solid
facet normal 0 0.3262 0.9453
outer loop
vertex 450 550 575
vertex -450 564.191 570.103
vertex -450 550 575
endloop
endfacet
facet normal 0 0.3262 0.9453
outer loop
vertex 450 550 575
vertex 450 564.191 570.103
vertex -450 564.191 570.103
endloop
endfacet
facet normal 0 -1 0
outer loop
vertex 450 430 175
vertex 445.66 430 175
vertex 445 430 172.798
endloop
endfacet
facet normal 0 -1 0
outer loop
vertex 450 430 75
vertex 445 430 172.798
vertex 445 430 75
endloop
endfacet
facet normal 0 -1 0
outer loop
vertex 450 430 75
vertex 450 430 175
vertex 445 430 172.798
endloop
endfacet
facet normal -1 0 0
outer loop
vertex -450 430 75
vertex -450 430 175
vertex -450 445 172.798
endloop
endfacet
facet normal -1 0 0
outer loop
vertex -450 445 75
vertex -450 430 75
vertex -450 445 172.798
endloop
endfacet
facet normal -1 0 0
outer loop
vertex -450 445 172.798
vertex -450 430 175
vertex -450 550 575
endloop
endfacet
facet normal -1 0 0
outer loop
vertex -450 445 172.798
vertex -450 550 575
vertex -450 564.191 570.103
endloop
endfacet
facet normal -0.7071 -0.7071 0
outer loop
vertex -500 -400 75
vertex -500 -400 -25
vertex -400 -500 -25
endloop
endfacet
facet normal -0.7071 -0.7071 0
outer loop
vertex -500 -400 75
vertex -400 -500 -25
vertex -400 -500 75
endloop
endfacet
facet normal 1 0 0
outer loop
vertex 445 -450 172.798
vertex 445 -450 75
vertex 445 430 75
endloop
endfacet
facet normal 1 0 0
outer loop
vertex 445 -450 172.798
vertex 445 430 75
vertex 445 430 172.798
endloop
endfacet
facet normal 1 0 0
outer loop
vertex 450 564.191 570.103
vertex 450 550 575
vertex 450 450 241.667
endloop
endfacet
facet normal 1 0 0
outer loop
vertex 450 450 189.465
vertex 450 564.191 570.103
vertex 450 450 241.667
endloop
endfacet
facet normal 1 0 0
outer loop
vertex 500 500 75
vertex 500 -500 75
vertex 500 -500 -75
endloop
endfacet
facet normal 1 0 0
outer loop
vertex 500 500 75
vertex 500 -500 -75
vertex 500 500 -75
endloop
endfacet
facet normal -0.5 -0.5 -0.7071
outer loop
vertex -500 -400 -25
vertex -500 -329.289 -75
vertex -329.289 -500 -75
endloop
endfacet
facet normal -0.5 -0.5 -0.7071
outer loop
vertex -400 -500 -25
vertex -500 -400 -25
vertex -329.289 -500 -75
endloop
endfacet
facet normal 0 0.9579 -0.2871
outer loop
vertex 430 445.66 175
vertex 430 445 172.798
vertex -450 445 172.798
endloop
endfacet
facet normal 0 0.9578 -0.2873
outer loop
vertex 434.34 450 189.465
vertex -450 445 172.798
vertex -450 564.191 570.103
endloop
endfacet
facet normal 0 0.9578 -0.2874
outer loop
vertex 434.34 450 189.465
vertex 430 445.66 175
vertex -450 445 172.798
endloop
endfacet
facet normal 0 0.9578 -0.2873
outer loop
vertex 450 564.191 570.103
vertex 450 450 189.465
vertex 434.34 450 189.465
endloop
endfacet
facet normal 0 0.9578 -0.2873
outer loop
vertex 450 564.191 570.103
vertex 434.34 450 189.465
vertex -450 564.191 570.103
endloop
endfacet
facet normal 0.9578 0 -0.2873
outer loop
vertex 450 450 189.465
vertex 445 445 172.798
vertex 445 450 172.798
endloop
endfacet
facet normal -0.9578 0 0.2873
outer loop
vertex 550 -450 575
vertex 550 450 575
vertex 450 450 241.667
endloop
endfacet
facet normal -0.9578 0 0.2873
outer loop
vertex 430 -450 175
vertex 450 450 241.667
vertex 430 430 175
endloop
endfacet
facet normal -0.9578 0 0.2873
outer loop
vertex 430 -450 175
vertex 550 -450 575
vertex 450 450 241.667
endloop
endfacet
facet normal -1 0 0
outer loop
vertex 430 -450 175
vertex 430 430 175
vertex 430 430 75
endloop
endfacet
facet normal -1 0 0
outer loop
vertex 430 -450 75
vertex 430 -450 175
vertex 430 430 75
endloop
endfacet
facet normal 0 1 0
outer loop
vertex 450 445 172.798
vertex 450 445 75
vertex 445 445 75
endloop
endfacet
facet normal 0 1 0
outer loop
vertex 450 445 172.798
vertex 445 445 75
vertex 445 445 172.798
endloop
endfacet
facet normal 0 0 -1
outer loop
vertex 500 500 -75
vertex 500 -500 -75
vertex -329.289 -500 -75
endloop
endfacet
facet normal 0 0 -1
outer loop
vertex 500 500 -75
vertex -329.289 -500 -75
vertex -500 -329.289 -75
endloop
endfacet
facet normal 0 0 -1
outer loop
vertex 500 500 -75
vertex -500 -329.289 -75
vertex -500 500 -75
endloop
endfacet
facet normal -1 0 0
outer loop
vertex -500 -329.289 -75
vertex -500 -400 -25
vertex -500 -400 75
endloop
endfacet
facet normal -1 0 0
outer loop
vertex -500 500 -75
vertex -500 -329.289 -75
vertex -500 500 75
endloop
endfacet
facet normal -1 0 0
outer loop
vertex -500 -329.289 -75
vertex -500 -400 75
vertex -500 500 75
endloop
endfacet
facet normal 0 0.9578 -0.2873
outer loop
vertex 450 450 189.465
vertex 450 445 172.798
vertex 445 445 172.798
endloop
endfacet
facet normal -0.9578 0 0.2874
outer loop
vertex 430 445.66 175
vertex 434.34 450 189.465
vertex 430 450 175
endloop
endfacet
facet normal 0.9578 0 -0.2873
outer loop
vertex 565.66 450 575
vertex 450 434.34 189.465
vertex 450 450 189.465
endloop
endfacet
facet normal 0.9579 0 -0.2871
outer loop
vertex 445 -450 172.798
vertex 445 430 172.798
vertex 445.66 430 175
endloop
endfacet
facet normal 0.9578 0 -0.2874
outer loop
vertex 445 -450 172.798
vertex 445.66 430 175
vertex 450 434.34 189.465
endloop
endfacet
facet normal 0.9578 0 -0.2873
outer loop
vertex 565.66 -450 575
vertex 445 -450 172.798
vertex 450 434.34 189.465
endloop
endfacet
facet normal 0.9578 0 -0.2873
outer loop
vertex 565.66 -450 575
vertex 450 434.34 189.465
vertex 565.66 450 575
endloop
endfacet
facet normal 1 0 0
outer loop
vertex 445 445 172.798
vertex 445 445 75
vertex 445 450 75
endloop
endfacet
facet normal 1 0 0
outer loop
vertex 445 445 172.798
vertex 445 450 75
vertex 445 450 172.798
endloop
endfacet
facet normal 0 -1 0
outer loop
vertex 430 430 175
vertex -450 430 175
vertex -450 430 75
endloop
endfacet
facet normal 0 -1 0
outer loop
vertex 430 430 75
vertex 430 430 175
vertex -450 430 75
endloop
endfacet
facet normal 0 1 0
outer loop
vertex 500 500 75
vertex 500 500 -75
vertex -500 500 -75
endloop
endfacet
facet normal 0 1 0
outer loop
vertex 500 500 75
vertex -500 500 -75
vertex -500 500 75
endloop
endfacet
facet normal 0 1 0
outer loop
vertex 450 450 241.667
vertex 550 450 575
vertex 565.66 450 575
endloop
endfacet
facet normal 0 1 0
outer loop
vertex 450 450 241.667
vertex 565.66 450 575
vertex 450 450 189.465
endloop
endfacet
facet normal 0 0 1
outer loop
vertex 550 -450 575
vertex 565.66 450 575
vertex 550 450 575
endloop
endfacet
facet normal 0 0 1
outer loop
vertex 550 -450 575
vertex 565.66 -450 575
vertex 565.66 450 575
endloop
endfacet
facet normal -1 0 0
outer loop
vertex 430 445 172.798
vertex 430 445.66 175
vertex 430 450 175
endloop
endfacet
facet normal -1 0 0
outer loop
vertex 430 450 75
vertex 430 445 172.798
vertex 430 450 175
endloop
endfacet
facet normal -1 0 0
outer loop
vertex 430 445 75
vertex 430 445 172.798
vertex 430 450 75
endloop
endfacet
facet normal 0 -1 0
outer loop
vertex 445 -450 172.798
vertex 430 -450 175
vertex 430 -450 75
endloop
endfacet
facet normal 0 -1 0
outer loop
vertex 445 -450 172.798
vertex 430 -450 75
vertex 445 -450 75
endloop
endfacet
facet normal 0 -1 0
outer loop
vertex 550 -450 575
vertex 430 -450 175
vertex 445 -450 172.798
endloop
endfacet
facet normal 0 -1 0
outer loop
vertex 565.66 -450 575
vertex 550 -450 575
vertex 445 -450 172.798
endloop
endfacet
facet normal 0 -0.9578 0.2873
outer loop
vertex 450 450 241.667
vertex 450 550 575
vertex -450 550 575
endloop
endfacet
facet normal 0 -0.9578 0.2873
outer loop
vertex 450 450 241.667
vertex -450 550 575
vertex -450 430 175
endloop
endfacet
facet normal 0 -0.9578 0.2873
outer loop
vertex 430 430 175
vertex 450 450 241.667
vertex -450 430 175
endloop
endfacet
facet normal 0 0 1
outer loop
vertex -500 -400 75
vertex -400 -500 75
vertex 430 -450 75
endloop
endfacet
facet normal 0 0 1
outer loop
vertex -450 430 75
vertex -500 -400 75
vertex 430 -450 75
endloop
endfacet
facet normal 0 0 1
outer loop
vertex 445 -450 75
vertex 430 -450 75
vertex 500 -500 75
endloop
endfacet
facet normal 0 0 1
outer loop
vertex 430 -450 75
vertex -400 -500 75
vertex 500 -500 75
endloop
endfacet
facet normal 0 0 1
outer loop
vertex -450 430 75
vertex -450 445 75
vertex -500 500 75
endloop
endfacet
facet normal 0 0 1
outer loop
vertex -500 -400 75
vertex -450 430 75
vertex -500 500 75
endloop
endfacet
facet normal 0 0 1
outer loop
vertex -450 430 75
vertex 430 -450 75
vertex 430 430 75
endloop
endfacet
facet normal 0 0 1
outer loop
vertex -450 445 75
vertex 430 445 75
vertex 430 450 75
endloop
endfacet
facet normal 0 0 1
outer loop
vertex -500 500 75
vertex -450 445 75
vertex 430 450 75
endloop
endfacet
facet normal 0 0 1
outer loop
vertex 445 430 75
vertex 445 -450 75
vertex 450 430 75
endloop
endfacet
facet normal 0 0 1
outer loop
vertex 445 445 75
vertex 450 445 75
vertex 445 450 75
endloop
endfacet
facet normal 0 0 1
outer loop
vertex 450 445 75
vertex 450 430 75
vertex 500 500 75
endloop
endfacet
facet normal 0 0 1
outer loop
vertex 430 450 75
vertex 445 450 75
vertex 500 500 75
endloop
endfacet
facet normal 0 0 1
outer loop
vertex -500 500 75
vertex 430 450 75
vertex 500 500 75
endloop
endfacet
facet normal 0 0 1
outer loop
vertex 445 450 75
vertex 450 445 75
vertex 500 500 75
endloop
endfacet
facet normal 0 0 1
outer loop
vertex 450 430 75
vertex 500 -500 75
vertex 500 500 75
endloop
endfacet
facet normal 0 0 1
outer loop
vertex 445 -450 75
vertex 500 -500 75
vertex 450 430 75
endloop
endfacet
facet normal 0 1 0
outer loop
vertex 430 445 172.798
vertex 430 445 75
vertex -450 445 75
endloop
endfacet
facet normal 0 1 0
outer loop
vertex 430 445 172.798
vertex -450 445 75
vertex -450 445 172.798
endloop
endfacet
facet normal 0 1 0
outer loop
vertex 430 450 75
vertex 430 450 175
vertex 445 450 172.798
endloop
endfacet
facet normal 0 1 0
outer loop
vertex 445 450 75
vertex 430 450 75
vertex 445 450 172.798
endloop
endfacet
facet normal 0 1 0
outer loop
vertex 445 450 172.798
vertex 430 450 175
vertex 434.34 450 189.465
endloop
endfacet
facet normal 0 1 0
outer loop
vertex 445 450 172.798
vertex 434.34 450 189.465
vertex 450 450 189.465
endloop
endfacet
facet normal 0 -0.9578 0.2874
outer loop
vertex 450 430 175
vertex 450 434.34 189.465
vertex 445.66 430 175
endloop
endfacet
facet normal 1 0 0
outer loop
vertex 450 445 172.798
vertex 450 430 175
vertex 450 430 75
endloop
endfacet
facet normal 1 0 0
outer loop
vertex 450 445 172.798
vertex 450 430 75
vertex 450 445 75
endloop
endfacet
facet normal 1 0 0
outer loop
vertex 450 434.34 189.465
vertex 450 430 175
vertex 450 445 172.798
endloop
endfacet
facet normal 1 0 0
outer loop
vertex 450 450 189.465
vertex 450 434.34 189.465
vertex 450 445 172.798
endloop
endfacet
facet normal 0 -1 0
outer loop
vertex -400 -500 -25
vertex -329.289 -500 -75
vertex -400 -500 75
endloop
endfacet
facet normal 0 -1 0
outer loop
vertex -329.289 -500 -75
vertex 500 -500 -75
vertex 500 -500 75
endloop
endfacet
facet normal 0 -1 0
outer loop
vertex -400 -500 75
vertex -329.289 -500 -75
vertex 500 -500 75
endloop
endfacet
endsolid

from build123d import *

# Parameters (mm, degrees)
F0_W     = 1000
F0_H     = 150
F1_DEPTH = 500
F3_DEPTH = 450
F5_DEPTH = 450
F6_SIZE  = 100
F7_SIZE  = 50


with BuildPart() as f1:
    # F0 (on Right) → F1 (new body, symmetric)
    with BuildSketch(Plane.YZ):
        Rectangle(F0_W, F0_H)
    extrude(amount=F1_DEPTH, both=True)

    # F2 (on Right) → F3 (join, symmetric)
    with BuildSketch(Plane.YZ):
        Polygon((430, 175), (430, 75), (445, 75), (445, 172.7984674554), (564.1914670014, 570.1033574602), (550, 575), align=None)
    extrude(amount=F3_DEPTH, both=True)

    # F4 (on Front) → F5 (join, symmetric)
    with BuildSketch(Plane.XZ):
        Polygon((430, 175), (430, 75), (445, 75), (445, 172.7984674554), (565.6604597634, 575), (550, 575), align=None)
    extrude(amount=F5_DEPTH, both=True)

    # F6
    f6_edges = [f1.edges().sort_by_distance(p)[0] for p in [
        (-500, -500, 0),
    ]]
    chamfer(f6_edges, length=F6_SIZE)

    # F7
    f7_edges = [f1.edges().sort_by_distance(p)[0] for p in [
        (-450, -450, -75),
    ]]
    chamfer(f7_edges, length=F7_SIZE)


solid = f1.part
